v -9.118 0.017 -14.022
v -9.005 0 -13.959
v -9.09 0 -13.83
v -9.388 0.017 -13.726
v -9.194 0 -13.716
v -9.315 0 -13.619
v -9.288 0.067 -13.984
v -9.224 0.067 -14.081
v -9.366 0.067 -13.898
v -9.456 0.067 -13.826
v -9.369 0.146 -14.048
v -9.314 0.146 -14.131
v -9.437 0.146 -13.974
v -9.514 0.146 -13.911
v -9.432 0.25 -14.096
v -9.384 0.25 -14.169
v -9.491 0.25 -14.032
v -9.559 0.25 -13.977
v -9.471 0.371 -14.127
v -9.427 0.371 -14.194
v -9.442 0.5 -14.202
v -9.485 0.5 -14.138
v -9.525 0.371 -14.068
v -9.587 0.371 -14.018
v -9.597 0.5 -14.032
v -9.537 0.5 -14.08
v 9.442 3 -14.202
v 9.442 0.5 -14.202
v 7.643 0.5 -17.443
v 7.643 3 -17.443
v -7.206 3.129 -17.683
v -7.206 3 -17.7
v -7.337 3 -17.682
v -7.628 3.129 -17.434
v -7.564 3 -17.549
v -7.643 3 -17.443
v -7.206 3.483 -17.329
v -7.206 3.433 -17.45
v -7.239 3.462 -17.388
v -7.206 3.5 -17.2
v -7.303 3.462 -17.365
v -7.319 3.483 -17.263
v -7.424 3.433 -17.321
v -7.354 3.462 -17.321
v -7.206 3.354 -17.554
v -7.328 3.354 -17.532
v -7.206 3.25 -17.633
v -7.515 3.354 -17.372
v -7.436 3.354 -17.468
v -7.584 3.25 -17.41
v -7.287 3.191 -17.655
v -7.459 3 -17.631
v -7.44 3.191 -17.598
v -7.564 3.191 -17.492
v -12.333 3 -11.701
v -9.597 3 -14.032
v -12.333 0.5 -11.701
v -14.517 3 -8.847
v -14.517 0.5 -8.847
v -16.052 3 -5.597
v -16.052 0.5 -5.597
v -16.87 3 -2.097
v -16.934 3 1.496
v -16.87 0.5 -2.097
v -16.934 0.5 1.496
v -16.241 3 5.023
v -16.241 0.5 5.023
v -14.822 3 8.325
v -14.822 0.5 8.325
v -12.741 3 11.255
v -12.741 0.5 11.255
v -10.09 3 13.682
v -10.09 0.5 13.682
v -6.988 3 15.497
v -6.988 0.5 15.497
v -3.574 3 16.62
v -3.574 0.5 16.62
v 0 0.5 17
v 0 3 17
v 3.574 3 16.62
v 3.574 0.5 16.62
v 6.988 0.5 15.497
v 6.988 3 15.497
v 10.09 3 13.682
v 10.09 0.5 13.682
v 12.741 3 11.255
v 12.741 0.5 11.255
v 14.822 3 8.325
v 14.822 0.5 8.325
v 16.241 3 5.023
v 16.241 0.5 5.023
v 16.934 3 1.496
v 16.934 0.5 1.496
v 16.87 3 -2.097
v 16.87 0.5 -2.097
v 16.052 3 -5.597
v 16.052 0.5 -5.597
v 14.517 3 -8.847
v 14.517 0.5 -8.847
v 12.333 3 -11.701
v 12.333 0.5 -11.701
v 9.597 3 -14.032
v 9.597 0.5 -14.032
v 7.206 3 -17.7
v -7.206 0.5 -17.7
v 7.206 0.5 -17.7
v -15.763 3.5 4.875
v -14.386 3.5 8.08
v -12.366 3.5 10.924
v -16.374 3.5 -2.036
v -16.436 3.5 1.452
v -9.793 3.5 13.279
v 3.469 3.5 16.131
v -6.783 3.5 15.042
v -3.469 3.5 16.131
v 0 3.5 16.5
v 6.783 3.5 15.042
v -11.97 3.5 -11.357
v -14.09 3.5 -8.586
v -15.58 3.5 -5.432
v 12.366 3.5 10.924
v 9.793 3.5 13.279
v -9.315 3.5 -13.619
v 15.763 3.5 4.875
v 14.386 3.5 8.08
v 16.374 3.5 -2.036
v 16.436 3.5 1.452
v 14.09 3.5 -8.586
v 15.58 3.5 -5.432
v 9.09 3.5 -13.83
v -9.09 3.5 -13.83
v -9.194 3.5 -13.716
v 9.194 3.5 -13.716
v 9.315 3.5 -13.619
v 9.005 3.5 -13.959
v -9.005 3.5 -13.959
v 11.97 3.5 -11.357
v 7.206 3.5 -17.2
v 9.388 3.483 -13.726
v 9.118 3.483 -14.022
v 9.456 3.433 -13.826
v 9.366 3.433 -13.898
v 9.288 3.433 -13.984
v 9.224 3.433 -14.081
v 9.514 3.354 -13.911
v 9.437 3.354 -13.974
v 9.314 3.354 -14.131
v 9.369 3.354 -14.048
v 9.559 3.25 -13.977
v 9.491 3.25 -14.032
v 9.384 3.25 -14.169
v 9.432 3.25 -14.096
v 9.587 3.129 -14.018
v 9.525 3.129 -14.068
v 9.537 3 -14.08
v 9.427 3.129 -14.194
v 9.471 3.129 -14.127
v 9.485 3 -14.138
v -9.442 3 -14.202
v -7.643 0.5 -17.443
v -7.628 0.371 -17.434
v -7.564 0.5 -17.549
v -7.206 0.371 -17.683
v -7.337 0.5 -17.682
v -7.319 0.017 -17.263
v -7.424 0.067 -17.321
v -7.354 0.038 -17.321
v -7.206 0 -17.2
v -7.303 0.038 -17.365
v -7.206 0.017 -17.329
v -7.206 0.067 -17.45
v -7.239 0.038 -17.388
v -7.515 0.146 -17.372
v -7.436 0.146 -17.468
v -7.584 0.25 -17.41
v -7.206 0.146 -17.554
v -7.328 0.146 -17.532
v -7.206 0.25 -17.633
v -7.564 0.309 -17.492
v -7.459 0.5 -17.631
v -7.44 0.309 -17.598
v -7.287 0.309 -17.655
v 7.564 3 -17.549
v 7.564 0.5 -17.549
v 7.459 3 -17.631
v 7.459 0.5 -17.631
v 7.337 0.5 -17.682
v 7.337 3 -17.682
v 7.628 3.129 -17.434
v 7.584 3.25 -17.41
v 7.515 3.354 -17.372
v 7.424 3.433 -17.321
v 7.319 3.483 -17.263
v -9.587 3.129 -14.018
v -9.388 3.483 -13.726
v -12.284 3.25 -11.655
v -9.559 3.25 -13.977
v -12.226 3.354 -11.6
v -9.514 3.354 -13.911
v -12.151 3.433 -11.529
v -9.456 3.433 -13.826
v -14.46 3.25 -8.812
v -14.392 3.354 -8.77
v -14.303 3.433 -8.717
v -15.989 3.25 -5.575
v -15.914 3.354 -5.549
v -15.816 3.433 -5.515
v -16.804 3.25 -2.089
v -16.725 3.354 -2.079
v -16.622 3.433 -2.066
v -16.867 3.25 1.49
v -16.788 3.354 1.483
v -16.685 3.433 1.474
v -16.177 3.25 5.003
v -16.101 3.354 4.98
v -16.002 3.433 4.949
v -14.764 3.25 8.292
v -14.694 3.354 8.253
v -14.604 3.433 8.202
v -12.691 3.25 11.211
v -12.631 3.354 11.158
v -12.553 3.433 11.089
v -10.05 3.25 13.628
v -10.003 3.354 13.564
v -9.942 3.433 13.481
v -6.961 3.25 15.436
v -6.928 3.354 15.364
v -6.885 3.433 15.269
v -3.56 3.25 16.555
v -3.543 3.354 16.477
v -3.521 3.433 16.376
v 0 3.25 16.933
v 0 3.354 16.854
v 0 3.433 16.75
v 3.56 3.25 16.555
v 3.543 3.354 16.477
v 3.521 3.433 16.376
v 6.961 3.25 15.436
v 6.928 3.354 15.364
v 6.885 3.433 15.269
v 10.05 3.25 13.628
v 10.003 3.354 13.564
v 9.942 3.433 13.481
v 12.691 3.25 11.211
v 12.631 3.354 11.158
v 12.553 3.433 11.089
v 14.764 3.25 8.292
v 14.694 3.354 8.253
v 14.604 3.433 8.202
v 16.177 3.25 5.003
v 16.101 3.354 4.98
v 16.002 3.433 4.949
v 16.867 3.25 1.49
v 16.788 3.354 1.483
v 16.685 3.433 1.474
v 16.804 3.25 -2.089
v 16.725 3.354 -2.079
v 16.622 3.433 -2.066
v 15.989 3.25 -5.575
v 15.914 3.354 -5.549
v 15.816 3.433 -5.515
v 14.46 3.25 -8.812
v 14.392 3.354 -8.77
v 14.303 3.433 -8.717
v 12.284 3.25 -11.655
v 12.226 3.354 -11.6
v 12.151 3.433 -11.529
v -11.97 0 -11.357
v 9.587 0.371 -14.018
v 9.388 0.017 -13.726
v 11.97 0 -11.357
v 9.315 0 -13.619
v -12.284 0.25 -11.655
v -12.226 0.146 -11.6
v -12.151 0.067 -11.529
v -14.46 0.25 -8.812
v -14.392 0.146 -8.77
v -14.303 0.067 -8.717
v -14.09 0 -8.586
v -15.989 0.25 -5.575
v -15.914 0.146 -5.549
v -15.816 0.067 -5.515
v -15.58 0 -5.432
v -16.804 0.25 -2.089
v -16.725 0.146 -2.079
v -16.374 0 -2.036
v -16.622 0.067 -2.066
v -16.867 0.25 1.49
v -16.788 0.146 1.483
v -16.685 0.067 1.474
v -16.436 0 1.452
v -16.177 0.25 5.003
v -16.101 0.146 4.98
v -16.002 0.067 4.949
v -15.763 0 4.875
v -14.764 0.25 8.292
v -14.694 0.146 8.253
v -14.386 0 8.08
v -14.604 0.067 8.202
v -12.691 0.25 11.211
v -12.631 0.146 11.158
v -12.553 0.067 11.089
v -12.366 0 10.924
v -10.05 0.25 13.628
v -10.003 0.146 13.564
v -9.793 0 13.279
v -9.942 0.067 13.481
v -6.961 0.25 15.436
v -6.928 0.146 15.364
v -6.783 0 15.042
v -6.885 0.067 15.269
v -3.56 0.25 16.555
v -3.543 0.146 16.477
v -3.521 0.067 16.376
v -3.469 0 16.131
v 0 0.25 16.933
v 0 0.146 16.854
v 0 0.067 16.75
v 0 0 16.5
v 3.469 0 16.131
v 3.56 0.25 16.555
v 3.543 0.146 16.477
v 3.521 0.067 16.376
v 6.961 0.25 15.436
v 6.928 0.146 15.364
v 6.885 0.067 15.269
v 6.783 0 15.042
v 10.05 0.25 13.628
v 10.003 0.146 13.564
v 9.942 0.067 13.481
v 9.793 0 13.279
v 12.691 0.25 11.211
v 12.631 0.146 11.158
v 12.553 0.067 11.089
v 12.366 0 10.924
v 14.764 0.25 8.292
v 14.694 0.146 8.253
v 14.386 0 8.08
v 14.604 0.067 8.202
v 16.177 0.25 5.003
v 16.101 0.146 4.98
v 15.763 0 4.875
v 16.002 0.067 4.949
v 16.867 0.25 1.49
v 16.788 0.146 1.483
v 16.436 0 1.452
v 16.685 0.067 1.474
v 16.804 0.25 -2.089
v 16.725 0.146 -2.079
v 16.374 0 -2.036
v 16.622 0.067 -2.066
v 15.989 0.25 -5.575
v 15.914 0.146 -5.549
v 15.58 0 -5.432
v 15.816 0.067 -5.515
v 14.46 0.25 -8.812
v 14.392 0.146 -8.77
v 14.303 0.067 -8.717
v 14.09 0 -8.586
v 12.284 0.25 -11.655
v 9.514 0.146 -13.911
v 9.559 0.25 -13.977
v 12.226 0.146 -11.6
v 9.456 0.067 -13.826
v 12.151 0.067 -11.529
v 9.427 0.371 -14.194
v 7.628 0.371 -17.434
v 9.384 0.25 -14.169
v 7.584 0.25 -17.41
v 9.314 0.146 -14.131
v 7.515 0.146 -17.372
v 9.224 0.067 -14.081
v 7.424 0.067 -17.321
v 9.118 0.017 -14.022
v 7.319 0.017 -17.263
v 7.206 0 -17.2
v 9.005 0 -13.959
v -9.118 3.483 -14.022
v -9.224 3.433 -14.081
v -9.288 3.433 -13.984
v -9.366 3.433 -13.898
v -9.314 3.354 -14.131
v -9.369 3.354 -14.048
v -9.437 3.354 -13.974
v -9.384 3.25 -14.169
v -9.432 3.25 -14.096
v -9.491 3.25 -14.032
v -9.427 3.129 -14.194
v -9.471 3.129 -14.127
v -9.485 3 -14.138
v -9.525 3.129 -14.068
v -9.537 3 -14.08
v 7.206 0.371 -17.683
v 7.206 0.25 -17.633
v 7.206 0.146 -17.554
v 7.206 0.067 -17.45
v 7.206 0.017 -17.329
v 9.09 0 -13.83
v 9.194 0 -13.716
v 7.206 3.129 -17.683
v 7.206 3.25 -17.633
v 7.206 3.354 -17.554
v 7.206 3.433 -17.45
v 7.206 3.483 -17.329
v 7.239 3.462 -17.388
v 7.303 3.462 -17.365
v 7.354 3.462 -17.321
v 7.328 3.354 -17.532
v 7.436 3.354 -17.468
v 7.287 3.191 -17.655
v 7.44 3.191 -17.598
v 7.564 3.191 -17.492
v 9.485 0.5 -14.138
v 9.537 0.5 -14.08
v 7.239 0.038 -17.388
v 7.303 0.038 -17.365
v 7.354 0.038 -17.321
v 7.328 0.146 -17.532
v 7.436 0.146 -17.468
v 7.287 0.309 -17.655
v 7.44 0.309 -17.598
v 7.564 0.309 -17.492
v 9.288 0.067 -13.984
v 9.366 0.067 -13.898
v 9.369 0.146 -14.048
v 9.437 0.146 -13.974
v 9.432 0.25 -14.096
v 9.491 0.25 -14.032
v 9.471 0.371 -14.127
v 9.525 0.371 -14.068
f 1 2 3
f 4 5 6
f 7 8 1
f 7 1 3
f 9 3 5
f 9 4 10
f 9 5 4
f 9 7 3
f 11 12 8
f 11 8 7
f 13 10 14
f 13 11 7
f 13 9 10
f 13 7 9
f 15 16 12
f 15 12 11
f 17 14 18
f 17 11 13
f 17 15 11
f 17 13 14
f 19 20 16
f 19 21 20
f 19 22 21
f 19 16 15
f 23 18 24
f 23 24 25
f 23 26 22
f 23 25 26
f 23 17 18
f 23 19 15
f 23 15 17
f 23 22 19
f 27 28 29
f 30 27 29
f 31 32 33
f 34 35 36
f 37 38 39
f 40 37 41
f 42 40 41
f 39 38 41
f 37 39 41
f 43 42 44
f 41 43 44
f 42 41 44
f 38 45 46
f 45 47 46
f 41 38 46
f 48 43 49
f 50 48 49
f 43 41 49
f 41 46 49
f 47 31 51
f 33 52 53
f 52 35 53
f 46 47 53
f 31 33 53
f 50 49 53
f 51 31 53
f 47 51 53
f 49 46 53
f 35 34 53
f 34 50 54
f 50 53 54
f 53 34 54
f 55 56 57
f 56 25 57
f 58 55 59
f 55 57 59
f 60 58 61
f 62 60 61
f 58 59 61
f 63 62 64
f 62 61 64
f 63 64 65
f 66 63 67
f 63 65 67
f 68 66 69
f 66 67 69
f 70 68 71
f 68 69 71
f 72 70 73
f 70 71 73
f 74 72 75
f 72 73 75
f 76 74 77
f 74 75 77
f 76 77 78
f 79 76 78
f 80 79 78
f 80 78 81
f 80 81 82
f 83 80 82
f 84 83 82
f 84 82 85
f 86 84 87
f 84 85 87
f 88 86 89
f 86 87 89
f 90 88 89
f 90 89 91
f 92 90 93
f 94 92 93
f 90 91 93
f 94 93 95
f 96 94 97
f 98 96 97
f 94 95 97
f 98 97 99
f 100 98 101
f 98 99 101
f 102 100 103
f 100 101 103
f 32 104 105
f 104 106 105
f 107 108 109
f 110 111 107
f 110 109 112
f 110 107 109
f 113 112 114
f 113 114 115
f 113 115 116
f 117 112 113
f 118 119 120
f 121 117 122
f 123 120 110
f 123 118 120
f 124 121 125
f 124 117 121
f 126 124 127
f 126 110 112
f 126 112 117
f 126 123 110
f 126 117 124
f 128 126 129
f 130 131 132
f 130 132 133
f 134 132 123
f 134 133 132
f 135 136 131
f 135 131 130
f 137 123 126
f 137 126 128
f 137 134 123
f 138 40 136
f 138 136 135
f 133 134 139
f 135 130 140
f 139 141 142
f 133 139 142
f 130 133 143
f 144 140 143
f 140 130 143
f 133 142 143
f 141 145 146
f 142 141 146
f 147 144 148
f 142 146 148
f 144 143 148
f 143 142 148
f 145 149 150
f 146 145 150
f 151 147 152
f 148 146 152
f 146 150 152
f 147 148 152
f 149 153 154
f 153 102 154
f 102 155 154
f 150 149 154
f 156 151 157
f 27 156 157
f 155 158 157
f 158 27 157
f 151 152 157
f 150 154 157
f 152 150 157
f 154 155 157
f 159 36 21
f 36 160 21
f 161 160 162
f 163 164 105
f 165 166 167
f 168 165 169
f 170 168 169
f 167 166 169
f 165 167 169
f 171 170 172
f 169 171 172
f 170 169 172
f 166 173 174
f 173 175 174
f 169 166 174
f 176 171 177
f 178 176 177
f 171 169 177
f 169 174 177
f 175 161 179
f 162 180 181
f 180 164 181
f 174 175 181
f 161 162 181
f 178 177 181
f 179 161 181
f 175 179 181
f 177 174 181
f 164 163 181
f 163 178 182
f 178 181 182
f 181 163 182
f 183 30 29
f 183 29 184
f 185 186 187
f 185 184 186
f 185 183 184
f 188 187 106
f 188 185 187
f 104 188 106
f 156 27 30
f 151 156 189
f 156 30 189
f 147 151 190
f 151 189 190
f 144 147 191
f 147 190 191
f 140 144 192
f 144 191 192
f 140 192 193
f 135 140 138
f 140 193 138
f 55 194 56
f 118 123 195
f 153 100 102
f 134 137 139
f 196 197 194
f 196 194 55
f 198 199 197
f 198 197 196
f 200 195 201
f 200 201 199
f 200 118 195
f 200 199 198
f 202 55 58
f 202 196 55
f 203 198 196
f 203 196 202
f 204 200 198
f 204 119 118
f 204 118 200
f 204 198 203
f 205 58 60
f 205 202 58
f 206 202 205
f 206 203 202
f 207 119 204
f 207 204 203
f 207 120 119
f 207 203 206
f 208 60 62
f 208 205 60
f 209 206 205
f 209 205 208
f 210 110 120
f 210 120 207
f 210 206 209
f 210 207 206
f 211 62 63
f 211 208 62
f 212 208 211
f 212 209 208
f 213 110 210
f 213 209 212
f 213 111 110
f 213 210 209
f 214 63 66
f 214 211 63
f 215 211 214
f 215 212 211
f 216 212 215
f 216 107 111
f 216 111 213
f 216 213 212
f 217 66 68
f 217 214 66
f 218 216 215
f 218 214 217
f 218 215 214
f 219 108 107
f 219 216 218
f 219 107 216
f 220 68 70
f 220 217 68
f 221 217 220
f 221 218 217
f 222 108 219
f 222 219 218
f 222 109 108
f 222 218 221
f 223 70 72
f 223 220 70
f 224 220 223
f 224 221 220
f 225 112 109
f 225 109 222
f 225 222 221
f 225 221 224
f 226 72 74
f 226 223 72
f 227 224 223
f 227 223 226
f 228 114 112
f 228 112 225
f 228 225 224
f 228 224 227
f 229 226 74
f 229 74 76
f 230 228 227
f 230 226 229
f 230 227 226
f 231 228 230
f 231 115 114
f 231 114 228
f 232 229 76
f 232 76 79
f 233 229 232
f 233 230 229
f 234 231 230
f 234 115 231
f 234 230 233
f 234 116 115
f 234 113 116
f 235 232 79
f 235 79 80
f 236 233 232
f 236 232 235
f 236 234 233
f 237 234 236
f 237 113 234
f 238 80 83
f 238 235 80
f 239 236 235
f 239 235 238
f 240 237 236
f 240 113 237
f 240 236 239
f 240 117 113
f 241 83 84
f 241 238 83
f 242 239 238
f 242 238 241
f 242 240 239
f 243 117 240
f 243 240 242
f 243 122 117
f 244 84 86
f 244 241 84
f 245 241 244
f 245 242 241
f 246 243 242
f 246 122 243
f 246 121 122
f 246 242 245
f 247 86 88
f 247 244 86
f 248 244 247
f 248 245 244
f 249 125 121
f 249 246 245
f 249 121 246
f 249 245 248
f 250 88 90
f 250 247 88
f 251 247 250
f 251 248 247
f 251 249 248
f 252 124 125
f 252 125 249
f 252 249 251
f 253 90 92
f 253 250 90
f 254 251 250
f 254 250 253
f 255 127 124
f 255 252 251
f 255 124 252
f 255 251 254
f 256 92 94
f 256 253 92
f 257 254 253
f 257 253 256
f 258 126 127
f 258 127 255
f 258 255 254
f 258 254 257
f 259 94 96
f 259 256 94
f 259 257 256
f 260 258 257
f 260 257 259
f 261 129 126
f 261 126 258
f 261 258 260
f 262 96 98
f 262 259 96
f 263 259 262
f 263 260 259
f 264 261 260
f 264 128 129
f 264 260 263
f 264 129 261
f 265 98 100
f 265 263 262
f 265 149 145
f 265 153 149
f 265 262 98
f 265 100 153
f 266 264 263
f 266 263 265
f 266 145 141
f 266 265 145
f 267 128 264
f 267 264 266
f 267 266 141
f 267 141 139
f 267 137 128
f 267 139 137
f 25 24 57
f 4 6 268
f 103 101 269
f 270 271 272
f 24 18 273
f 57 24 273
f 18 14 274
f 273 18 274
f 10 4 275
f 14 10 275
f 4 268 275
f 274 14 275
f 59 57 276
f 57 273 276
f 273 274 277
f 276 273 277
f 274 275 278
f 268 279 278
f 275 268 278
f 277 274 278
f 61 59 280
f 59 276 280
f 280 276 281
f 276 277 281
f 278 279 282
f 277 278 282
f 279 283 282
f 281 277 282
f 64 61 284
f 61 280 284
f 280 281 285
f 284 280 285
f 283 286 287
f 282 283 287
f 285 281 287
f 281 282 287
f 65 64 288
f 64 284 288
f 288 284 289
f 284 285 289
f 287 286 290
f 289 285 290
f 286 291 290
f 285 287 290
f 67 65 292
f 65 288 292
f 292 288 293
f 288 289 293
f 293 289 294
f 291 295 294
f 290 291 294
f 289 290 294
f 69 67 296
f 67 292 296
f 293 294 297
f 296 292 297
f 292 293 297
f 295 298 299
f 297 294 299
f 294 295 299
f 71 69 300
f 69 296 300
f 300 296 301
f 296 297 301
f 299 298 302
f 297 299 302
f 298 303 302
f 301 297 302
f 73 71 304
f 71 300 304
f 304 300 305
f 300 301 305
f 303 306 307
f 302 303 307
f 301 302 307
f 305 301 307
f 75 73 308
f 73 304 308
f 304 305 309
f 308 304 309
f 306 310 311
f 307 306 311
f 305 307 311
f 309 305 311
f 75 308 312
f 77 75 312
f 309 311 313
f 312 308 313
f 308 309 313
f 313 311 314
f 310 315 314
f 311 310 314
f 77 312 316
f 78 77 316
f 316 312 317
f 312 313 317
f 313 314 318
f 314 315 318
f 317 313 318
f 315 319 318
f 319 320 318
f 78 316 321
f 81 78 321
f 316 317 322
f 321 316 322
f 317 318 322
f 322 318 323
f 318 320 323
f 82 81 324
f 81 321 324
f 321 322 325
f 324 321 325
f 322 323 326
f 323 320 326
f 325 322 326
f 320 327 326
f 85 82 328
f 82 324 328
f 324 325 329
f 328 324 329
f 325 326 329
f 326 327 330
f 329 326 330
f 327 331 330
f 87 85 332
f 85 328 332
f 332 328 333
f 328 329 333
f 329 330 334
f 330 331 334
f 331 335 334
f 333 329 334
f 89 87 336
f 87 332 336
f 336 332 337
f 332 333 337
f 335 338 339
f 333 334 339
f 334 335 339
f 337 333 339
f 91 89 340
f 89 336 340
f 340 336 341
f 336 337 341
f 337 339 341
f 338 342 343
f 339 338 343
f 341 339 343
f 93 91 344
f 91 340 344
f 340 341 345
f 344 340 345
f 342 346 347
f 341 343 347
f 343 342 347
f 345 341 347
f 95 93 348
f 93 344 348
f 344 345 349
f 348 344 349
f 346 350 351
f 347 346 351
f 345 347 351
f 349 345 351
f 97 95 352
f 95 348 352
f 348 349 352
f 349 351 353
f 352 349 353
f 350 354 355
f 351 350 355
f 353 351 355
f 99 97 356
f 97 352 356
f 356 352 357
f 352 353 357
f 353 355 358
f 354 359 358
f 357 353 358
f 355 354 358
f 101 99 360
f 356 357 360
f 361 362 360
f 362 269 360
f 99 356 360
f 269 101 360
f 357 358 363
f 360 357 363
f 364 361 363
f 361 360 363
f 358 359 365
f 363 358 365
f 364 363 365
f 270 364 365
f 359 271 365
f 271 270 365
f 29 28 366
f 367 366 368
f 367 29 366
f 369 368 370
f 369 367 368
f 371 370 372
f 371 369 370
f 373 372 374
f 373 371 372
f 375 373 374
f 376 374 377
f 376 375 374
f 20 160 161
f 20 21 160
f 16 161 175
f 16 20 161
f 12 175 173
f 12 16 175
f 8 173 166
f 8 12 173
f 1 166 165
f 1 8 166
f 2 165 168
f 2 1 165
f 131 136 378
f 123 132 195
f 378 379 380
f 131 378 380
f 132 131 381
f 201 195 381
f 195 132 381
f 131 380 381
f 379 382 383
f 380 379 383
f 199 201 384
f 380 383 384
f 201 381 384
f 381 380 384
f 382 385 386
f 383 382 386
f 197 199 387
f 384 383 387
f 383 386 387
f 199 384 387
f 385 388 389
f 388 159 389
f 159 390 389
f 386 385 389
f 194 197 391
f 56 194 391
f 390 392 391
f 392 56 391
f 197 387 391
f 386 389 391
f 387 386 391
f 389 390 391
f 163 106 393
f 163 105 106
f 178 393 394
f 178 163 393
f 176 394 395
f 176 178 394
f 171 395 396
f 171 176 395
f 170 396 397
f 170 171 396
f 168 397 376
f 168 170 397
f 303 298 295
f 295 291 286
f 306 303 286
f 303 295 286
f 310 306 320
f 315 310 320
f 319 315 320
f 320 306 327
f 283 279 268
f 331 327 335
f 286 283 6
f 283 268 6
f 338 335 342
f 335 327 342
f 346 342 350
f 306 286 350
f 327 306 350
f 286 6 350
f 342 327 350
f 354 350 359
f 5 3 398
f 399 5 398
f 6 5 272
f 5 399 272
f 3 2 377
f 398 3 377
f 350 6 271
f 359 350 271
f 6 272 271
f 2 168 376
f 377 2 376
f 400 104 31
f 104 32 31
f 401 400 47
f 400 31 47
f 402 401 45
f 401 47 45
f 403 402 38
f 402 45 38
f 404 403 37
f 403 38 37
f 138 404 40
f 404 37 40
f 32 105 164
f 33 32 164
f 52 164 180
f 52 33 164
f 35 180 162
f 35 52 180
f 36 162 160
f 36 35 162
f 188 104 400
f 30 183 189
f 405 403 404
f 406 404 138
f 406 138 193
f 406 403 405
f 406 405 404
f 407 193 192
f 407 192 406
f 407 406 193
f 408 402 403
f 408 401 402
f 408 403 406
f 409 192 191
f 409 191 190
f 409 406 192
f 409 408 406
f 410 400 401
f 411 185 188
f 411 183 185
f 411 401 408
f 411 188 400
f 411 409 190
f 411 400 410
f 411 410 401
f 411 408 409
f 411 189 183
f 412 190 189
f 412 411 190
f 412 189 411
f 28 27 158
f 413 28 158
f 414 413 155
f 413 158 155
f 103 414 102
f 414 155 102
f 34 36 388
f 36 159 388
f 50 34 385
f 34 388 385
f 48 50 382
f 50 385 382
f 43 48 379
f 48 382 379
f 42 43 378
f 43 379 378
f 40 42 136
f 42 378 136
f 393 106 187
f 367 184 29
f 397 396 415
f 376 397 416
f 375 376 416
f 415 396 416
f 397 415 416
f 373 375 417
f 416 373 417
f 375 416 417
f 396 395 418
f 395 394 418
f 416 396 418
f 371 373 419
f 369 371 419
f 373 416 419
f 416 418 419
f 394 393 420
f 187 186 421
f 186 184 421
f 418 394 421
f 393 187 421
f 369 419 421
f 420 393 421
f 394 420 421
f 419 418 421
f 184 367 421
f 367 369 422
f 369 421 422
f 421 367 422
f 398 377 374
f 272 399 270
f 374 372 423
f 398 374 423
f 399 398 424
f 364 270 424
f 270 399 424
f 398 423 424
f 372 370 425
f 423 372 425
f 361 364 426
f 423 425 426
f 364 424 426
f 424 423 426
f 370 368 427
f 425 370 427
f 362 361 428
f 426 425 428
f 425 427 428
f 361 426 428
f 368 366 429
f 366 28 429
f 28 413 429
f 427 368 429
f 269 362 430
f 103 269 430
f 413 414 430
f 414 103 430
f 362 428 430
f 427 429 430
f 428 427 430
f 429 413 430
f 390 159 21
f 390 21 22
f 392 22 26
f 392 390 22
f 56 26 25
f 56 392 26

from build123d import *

# Parameters (mm, degrees)
SKETCH1_R           = 17
BOSS_EXTRUDE1_DEPTH = 3.5
FILLET1_R           = 0.5


with BuildPart() as part:
    # Sketch1 → Boss-Extrude1 (new body)
    with BuildSketch(Plane(origin=(0, 0, 0), x_dir=(1, 0, 0), z_dir=(0, 1, 0))):
        Circle(SKETCH1_R)
        with BuildLine():
            Line((7.5, 17.7), (-7.5, 17.7))
            Line((-7.5, 17.7), (-9.5, 14.09787218))
            ThreePointArc((-9.5, 14.09787218), (0, 17), (9.5, 14.09787218))
            Line((9.5, 14.09787218), (7.5, 17.7))
        make_face()
    extrude(amount=BOSS_EXTRUDE1_DEPTH)

    # Fillet1
    fillet1_edges = [part.edges().sort_by_distance(p)[0] for p in [
        (0, 3.5, -17.7),
        (-8.5, 3.5, -15.89893609),
        (0, 3.5, 17),
        (-8.5, 0, -15.89893609),
        (0, 0, -17.7),
        (8.5, 0, -15.89893609),
        (0, 0, 17),
        (8.5, 3.5, -15.89893609),
        (-9.5, 1.75, -14.09787218),
        (-7.5, 1.75, -17.7),
        (7.5, 1.75, -17.7),
        (9.5, 1.75, -14.09787218),
    ]]
    fillet(fillet1_edges, radius=FILLET1_R)


solid = part.part
